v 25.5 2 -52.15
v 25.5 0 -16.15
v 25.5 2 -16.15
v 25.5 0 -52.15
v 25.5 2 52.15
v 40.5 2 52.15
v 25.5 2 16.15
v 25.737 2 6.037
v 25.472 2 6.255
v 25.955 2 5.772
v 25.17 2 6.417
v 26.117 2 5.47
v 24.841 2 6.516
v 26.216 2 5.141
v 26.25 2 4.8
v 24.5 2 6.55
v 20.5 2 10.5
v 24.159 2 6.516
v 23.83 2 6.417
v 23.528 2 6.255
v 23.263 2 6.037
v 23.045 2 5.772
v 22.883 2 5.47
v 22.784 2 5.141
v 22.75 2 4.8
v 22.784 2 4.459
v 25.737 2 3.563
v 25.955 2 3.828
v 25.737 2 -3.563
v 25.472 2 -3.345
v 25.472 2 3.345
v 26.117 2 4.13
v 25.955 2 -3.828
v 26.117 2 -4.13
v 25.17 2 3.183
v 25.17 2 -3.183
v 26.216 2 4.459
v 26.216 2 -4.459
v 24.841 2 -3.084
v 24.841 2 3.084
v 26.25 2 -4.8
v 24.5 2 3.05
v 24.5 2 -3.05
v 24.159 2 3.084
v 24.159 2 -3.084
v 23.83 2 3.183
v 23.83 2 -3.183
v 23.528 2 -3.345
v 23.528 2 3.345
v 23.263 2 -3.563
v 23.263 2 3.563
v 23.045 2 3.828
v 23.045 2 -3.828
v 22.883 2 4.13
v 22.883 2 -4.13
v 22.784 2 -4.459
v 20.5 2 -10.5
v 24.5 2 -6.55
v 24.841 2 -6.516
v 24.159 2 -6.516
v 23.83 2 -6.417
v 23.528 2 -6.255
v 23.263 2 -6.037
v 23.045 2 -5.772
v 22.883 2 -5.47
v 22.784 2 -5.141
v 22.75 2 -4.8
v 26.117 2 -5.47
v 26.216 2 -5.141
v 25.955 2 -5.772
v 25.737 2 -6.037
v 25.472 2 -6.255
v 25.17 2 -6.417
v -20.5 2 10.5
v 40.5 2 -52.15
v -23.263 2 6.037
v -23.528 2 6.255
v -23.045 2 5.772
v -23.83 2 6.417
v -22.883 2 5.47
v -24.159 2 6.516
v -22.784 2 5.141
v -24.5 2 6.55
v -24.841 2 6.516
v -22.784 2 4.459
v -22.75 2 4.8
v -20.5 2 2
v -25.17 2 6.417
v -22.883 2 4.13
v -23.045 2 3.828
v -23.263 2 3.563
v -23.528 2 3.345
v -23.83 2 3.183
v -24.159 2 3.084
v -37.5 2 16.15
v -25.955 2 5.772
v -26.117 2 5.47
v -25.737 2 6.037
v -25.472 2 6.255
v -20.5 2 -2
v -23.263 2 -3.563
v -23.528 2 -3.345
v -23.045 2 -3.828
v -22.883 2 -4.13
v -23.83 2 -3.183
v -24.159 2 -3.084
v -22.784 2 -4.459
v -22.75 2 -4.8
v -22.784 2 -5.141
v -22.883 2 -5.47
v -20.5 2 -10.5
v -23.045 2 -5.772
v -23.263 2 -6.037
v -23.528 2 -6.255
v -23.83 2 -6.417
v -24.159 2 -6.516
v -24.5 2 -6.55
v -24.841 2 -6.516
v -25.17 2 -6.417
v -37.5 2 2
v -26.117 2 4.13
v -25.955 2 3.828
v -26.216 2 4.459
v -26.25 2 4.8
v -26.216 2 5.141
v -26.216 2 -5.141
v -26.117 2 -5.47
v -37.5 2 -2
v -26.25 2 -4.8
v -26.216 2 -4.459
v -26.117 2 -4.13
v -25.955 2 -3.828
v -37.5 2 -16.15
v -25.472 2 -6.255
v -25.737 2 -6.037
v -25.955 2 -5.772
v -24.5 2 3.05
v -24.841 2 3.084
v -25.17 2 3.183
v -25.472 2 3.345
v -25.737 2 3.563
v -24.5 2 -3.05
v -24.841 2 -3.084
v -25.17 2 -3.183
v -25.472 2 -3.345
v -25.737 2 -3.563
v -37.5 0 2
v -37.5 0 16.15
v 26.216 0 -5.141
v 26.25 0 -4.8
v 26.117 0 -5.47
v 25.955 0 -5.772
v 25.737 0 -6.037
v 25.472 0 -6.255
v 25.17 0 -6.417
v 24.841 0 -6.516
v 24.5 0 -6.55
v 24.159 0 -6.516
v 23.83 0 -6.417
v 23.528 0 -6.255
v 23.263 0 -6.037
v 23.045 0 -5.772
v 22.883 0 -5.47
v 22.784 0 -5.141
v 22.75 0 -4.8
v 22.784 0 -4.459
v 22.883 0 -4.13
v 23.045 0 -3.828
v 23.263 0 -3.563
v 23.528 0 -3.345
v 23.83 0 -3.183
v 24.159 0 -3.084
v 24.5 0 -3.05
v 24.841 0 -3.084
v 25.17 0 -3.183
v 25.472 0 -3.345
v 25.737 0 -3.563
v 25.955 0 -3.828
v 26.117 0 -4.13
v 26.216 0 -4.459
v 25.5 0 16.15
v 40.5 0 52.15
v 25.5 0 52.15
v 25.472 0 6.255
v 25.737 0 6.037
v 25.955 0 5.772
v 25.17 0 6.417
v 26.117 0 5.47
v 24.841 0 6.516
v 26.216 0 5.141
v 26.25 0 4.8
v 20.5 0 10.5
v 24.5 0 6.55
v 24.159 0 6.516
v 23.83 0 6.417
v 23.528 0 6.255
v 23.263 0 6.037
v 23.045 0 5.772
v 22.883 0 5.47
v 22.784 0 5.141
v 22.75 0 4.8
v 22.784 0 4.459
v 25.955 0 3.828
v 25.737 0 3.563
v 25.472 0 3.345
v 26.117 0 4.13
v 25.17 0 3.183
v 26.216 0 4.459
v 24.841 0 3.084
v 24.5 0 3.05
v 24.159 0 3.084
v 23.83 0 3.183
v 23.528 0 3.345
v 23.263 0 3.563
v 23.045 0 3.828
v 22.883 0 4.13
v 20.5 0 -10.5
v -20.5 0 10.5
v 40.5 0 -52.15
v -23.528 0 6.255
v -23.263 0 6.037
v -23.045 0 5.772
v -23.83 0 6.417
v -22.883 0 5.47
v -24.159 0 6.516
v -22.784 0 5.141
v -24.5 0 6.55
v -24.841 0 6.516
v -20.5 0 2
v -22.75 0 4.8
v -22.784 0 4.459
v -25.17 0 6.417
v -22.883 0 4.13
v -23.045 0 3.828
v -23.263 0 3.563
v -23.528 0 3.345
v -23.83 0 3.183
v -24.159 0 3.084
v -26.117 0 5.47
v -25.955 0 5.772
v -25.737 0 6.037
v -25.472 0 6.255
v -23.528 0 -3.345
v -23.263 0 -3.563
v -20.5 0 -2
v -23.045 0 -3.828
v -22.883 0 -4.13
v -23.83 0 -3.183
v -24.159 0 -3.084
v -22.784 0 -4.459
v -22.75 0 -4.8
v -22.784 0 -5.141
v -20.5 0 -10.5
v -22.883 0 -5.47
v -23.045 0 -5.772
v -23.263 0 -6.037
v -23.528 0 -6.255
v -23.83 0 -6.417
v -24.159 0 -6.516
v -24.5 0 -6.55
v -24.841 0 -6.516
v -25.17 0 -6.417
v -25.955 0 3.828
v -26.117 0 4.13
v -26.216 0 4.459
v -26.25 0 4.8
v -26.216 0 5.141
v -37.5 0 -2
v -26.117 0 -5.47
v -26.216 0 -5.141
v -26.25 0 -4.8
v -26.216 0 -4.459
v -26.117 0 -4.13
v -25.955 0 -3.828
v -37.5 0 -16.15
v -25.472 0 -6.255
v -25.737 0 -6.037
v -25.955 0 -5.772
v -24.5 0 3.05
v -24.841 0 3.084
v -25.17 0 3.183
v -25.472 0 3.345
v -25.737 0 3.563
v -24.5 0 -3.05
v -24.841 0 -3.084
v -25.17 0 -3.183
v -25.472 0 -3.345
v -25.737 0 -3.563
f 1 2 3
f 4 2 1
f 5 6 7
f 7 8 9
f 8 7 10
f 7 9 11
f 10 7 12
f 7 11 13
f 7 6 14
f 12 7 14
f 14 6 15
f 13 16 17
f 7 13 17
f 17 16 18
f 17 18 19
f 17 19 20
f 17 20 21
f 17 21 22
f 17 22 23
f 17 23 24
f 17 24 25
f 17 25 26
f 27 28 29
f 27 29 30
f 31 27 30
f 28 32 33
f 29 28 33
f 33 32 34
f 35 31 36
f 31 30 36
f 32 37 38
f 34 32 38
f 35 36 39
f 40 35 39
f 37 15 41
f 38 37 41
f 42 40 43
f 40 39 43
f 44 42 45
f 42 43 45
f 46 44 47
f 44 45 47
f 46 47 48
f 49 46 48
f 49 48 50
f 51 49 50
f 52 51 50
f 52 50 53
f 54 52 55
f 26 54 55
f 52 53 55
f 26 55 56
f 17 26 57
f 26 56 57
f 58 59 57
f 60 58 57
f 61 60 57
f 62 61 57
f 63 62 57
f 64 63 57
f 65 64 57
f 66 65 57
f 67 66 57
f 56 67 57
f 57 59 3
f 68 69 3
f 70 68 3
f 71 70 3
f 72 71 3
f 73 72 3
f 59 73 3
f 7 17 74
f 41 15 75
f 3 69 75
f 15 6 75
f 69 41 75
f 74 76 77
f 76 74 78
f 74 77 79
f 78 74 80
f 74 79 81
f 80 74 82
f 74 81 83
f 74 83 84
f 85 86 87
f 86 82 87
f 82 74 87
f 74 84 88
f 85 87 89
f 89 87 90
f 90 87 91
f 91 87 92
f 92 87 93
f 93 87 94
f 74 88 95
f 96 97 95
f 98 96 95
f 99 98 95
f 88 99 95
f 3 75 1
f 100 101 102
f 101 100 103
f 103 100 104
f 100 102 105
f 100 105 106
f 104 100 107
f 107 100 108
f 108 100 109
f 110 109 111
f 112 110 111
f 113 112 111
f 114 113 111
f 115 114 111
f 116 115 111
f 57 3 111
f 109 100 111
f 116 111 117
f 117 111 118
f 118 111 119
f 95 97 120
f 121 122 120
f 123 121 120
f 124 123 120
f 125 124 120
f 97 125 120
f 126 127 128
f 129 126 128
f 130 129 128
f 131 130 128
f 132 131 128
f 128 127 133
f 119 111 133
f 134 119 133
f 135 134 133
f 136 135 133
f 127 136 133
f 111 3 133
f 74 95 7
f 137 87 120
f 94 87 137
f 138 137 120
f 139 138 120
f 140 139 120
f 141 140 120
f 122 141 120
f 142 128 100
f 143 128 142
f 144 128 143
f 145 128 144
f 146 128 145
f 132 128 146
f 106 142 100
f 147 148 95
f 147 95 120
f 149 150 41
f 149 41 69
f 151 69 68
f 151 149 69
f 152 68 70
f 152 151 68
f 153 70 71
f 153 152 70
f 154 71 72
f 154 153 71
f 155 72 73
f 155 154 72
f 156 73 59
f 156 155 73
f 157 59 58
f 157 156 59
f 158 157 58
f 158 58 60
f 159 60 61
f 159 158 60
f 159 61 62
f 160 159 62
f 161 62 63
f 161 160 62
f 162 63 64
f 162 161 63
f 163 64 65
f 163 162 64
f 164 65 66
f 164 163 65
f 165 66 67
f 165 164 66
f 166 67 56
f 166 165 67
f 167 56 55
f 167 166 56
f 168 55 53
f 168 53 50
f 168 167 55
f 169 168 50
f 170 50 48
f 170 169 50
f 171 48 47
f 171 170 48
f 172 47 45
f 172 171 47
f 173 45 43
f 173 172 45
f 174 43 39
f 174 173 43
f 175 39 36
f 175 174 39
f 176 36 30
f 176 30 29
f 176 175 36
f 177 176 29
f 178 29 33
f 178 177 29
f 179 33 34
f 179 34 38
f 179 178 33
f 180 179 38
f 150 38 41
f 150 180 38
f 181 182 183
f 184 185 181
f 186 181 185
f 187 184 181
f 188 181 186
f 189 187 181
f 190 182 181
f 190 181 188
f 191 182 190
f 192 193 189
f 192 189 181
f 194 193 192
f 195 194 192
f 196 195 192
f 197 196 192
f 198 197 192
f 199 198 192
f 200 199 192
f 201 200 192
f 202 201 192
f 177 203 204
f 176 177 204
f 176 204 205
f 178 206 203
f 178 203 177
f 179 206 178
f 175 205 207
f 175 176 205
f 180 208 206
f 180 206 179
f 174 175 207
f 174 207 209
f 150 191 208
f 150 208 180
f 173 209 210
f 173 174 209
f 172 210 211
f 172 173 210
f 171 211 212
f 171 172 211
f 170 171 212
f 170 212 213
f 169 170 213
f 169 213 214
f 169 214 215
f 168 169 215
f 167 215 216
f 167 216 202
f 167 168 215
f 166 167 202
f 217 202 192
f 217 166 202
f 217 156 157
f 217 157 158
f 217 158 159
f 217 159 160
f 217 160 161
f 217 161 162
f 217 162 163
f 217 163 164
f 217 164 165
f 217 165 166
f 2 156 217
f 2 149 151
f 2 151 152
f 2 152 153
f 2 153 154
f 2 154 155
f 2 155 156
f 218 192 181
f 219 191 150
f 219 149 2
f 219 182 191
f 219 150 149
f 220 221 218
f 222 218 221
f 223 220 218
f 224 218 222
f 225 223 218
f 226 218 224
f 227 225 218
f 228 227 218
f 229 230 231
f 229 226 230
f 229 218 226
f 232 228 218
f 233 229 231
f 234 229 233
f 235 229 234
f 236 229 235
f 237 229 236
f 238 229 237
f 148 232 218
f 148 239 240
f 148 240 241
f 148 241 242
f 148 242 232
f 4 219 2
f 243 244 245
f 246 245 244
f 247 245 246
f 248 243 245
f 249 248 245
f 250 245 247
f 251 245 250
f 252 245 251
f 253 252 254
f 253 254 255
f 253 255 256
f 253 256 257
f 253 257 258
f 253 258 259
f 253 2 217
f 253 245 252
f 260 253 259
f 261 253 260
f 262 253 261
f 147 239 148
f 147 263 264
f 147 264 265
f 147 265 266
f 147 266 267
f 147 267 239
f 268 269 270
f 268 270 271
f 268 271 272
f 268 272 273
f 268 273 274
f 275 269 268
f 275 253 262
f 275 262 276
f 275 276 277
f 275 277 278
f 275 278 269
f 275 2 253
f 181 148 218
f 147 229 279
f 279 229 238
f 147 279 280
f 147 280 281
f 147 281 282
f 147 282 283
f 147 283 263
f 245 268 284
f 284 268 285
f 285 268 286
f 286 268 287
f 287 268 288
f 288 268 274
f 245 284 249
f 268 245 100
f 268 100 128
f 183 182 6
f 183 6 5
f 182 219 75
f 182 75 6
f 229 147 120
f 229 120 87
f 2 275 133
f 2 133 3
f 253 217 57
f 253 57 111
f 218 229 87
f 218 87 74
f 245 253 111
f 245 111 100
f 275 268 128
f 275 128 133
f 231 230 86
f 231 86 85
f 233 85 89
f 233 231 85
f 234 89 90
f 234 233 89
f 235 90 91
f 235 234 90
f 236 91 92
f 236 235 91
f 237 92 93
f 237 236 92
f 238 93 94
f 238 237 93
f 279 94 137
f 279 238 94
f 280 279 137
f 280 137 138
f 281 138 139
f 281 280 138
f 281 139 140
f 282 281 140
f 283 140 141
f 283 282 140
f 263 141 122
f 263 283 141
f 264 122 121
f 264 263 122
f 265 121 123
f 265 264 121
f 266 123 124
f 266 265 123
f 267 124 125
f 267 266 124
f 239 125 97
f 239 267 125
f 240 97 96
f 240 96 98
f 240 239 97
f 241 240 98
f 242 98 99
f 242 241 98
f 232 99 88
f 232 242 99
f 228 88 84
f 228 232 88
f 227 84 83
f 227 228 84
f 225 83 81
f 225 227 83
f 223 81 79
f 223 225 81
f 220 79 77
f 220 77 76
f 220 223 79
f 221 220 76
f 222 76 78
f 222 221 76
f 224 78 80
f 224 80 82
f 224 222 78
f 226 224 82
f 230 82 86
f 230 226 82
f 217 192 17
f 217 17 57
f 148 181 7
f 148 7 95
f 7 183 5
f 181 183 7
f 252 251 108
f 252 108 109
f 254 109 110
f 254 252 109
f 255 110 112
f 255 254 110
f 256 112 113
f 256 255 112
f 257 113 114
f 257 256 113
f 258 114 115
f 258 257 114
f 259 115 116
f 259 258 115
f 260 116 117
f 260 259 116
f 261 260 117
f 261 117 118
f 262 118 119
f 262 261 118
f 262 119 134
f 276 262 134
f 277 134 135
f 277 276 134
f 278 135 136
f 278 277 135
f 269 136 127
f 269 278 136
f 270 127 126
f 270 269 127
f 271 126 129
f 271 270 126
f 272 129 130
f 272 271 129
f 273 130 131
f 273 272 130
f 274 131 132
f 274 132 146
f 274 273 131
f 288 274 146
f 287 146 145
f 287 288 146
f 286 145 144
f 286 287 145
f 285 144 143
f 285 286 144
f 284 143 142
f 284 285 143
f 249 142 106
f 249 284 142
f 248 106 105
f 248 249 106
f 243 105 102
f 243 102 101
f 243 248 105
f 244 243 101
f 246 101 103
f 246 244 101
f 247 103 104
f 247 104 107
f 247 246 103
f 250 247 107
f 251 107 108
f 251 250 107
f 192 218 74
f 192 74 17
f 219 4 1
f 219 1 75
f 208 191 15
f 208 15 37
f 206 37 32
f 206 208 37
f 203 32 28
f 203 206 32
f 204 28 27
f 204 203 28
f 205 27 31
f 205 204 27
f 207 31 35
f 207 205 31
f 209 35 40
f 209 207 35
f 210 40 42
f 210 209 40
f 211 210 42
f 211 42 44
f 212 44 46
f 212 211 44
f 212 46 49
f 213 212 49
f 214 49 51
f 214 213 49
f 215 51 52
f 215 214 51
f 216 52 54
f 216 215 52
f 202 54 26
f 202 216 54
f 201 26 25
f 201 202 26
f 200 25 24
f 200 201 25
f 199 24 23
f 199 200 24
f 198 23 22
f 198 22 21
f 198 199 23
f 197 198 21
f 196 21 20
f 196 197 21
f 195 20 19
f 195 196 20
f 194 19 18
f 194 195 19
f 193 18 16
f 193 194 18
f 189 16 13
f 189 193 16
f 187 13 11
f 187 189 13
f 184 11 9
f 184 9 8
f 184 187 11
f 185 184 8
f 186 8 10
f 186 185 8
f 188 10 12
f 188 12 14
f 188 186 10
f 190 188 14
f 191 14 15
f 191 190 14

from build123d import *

# Parameters (mm, degrees)
SKETCH1_R           = 1.75
BOSS_EXTRUDE1_DEPTH = 2


with BuildPart() as part:
    # Sketch1 → Boss-Extrude1 (new body)
    with BuildSketch(Plane(origin=(0, 0, 0), x_dir=(1, 0, 0), z_dir=(0, 1, 0))):
        Polygon((-37.5, 16.15), (25.5, 16.15), (25.5, 52.15), (40.5, 52.15), (40.5, -52.15), (25.5, -52.15), (25.5, -16.15), (-37.5, -16.15), (-37.5, -2), (-20.5, -2), (-20.5, -10.5), (20.5, -10.5), (20.5, 10.5), (-20.5, 10.5), (-20.5, 2), (-37.5, 2), align=None)
        with Locations((-24.5, 4.8)):
            Circle(SKETCH1_R, mode=Mode.SUBTRACT)
        with Locations((-24.5, -4.8)):
            Circle(SKETCH1_R, mode=Mode.SUBTRACT)
        with Locations((24.5, -4.8)):
            Circle(SKETCH1_R, mode=Mode.SUBTRACT)
        with Locations((24.5, 4.8)):
            Circle(SKETCH1_R, mode=Mode.SUBTRACT)
    extrude(amount=BOSS_EXTRUDE1_DEPTH)


solid = part.part
